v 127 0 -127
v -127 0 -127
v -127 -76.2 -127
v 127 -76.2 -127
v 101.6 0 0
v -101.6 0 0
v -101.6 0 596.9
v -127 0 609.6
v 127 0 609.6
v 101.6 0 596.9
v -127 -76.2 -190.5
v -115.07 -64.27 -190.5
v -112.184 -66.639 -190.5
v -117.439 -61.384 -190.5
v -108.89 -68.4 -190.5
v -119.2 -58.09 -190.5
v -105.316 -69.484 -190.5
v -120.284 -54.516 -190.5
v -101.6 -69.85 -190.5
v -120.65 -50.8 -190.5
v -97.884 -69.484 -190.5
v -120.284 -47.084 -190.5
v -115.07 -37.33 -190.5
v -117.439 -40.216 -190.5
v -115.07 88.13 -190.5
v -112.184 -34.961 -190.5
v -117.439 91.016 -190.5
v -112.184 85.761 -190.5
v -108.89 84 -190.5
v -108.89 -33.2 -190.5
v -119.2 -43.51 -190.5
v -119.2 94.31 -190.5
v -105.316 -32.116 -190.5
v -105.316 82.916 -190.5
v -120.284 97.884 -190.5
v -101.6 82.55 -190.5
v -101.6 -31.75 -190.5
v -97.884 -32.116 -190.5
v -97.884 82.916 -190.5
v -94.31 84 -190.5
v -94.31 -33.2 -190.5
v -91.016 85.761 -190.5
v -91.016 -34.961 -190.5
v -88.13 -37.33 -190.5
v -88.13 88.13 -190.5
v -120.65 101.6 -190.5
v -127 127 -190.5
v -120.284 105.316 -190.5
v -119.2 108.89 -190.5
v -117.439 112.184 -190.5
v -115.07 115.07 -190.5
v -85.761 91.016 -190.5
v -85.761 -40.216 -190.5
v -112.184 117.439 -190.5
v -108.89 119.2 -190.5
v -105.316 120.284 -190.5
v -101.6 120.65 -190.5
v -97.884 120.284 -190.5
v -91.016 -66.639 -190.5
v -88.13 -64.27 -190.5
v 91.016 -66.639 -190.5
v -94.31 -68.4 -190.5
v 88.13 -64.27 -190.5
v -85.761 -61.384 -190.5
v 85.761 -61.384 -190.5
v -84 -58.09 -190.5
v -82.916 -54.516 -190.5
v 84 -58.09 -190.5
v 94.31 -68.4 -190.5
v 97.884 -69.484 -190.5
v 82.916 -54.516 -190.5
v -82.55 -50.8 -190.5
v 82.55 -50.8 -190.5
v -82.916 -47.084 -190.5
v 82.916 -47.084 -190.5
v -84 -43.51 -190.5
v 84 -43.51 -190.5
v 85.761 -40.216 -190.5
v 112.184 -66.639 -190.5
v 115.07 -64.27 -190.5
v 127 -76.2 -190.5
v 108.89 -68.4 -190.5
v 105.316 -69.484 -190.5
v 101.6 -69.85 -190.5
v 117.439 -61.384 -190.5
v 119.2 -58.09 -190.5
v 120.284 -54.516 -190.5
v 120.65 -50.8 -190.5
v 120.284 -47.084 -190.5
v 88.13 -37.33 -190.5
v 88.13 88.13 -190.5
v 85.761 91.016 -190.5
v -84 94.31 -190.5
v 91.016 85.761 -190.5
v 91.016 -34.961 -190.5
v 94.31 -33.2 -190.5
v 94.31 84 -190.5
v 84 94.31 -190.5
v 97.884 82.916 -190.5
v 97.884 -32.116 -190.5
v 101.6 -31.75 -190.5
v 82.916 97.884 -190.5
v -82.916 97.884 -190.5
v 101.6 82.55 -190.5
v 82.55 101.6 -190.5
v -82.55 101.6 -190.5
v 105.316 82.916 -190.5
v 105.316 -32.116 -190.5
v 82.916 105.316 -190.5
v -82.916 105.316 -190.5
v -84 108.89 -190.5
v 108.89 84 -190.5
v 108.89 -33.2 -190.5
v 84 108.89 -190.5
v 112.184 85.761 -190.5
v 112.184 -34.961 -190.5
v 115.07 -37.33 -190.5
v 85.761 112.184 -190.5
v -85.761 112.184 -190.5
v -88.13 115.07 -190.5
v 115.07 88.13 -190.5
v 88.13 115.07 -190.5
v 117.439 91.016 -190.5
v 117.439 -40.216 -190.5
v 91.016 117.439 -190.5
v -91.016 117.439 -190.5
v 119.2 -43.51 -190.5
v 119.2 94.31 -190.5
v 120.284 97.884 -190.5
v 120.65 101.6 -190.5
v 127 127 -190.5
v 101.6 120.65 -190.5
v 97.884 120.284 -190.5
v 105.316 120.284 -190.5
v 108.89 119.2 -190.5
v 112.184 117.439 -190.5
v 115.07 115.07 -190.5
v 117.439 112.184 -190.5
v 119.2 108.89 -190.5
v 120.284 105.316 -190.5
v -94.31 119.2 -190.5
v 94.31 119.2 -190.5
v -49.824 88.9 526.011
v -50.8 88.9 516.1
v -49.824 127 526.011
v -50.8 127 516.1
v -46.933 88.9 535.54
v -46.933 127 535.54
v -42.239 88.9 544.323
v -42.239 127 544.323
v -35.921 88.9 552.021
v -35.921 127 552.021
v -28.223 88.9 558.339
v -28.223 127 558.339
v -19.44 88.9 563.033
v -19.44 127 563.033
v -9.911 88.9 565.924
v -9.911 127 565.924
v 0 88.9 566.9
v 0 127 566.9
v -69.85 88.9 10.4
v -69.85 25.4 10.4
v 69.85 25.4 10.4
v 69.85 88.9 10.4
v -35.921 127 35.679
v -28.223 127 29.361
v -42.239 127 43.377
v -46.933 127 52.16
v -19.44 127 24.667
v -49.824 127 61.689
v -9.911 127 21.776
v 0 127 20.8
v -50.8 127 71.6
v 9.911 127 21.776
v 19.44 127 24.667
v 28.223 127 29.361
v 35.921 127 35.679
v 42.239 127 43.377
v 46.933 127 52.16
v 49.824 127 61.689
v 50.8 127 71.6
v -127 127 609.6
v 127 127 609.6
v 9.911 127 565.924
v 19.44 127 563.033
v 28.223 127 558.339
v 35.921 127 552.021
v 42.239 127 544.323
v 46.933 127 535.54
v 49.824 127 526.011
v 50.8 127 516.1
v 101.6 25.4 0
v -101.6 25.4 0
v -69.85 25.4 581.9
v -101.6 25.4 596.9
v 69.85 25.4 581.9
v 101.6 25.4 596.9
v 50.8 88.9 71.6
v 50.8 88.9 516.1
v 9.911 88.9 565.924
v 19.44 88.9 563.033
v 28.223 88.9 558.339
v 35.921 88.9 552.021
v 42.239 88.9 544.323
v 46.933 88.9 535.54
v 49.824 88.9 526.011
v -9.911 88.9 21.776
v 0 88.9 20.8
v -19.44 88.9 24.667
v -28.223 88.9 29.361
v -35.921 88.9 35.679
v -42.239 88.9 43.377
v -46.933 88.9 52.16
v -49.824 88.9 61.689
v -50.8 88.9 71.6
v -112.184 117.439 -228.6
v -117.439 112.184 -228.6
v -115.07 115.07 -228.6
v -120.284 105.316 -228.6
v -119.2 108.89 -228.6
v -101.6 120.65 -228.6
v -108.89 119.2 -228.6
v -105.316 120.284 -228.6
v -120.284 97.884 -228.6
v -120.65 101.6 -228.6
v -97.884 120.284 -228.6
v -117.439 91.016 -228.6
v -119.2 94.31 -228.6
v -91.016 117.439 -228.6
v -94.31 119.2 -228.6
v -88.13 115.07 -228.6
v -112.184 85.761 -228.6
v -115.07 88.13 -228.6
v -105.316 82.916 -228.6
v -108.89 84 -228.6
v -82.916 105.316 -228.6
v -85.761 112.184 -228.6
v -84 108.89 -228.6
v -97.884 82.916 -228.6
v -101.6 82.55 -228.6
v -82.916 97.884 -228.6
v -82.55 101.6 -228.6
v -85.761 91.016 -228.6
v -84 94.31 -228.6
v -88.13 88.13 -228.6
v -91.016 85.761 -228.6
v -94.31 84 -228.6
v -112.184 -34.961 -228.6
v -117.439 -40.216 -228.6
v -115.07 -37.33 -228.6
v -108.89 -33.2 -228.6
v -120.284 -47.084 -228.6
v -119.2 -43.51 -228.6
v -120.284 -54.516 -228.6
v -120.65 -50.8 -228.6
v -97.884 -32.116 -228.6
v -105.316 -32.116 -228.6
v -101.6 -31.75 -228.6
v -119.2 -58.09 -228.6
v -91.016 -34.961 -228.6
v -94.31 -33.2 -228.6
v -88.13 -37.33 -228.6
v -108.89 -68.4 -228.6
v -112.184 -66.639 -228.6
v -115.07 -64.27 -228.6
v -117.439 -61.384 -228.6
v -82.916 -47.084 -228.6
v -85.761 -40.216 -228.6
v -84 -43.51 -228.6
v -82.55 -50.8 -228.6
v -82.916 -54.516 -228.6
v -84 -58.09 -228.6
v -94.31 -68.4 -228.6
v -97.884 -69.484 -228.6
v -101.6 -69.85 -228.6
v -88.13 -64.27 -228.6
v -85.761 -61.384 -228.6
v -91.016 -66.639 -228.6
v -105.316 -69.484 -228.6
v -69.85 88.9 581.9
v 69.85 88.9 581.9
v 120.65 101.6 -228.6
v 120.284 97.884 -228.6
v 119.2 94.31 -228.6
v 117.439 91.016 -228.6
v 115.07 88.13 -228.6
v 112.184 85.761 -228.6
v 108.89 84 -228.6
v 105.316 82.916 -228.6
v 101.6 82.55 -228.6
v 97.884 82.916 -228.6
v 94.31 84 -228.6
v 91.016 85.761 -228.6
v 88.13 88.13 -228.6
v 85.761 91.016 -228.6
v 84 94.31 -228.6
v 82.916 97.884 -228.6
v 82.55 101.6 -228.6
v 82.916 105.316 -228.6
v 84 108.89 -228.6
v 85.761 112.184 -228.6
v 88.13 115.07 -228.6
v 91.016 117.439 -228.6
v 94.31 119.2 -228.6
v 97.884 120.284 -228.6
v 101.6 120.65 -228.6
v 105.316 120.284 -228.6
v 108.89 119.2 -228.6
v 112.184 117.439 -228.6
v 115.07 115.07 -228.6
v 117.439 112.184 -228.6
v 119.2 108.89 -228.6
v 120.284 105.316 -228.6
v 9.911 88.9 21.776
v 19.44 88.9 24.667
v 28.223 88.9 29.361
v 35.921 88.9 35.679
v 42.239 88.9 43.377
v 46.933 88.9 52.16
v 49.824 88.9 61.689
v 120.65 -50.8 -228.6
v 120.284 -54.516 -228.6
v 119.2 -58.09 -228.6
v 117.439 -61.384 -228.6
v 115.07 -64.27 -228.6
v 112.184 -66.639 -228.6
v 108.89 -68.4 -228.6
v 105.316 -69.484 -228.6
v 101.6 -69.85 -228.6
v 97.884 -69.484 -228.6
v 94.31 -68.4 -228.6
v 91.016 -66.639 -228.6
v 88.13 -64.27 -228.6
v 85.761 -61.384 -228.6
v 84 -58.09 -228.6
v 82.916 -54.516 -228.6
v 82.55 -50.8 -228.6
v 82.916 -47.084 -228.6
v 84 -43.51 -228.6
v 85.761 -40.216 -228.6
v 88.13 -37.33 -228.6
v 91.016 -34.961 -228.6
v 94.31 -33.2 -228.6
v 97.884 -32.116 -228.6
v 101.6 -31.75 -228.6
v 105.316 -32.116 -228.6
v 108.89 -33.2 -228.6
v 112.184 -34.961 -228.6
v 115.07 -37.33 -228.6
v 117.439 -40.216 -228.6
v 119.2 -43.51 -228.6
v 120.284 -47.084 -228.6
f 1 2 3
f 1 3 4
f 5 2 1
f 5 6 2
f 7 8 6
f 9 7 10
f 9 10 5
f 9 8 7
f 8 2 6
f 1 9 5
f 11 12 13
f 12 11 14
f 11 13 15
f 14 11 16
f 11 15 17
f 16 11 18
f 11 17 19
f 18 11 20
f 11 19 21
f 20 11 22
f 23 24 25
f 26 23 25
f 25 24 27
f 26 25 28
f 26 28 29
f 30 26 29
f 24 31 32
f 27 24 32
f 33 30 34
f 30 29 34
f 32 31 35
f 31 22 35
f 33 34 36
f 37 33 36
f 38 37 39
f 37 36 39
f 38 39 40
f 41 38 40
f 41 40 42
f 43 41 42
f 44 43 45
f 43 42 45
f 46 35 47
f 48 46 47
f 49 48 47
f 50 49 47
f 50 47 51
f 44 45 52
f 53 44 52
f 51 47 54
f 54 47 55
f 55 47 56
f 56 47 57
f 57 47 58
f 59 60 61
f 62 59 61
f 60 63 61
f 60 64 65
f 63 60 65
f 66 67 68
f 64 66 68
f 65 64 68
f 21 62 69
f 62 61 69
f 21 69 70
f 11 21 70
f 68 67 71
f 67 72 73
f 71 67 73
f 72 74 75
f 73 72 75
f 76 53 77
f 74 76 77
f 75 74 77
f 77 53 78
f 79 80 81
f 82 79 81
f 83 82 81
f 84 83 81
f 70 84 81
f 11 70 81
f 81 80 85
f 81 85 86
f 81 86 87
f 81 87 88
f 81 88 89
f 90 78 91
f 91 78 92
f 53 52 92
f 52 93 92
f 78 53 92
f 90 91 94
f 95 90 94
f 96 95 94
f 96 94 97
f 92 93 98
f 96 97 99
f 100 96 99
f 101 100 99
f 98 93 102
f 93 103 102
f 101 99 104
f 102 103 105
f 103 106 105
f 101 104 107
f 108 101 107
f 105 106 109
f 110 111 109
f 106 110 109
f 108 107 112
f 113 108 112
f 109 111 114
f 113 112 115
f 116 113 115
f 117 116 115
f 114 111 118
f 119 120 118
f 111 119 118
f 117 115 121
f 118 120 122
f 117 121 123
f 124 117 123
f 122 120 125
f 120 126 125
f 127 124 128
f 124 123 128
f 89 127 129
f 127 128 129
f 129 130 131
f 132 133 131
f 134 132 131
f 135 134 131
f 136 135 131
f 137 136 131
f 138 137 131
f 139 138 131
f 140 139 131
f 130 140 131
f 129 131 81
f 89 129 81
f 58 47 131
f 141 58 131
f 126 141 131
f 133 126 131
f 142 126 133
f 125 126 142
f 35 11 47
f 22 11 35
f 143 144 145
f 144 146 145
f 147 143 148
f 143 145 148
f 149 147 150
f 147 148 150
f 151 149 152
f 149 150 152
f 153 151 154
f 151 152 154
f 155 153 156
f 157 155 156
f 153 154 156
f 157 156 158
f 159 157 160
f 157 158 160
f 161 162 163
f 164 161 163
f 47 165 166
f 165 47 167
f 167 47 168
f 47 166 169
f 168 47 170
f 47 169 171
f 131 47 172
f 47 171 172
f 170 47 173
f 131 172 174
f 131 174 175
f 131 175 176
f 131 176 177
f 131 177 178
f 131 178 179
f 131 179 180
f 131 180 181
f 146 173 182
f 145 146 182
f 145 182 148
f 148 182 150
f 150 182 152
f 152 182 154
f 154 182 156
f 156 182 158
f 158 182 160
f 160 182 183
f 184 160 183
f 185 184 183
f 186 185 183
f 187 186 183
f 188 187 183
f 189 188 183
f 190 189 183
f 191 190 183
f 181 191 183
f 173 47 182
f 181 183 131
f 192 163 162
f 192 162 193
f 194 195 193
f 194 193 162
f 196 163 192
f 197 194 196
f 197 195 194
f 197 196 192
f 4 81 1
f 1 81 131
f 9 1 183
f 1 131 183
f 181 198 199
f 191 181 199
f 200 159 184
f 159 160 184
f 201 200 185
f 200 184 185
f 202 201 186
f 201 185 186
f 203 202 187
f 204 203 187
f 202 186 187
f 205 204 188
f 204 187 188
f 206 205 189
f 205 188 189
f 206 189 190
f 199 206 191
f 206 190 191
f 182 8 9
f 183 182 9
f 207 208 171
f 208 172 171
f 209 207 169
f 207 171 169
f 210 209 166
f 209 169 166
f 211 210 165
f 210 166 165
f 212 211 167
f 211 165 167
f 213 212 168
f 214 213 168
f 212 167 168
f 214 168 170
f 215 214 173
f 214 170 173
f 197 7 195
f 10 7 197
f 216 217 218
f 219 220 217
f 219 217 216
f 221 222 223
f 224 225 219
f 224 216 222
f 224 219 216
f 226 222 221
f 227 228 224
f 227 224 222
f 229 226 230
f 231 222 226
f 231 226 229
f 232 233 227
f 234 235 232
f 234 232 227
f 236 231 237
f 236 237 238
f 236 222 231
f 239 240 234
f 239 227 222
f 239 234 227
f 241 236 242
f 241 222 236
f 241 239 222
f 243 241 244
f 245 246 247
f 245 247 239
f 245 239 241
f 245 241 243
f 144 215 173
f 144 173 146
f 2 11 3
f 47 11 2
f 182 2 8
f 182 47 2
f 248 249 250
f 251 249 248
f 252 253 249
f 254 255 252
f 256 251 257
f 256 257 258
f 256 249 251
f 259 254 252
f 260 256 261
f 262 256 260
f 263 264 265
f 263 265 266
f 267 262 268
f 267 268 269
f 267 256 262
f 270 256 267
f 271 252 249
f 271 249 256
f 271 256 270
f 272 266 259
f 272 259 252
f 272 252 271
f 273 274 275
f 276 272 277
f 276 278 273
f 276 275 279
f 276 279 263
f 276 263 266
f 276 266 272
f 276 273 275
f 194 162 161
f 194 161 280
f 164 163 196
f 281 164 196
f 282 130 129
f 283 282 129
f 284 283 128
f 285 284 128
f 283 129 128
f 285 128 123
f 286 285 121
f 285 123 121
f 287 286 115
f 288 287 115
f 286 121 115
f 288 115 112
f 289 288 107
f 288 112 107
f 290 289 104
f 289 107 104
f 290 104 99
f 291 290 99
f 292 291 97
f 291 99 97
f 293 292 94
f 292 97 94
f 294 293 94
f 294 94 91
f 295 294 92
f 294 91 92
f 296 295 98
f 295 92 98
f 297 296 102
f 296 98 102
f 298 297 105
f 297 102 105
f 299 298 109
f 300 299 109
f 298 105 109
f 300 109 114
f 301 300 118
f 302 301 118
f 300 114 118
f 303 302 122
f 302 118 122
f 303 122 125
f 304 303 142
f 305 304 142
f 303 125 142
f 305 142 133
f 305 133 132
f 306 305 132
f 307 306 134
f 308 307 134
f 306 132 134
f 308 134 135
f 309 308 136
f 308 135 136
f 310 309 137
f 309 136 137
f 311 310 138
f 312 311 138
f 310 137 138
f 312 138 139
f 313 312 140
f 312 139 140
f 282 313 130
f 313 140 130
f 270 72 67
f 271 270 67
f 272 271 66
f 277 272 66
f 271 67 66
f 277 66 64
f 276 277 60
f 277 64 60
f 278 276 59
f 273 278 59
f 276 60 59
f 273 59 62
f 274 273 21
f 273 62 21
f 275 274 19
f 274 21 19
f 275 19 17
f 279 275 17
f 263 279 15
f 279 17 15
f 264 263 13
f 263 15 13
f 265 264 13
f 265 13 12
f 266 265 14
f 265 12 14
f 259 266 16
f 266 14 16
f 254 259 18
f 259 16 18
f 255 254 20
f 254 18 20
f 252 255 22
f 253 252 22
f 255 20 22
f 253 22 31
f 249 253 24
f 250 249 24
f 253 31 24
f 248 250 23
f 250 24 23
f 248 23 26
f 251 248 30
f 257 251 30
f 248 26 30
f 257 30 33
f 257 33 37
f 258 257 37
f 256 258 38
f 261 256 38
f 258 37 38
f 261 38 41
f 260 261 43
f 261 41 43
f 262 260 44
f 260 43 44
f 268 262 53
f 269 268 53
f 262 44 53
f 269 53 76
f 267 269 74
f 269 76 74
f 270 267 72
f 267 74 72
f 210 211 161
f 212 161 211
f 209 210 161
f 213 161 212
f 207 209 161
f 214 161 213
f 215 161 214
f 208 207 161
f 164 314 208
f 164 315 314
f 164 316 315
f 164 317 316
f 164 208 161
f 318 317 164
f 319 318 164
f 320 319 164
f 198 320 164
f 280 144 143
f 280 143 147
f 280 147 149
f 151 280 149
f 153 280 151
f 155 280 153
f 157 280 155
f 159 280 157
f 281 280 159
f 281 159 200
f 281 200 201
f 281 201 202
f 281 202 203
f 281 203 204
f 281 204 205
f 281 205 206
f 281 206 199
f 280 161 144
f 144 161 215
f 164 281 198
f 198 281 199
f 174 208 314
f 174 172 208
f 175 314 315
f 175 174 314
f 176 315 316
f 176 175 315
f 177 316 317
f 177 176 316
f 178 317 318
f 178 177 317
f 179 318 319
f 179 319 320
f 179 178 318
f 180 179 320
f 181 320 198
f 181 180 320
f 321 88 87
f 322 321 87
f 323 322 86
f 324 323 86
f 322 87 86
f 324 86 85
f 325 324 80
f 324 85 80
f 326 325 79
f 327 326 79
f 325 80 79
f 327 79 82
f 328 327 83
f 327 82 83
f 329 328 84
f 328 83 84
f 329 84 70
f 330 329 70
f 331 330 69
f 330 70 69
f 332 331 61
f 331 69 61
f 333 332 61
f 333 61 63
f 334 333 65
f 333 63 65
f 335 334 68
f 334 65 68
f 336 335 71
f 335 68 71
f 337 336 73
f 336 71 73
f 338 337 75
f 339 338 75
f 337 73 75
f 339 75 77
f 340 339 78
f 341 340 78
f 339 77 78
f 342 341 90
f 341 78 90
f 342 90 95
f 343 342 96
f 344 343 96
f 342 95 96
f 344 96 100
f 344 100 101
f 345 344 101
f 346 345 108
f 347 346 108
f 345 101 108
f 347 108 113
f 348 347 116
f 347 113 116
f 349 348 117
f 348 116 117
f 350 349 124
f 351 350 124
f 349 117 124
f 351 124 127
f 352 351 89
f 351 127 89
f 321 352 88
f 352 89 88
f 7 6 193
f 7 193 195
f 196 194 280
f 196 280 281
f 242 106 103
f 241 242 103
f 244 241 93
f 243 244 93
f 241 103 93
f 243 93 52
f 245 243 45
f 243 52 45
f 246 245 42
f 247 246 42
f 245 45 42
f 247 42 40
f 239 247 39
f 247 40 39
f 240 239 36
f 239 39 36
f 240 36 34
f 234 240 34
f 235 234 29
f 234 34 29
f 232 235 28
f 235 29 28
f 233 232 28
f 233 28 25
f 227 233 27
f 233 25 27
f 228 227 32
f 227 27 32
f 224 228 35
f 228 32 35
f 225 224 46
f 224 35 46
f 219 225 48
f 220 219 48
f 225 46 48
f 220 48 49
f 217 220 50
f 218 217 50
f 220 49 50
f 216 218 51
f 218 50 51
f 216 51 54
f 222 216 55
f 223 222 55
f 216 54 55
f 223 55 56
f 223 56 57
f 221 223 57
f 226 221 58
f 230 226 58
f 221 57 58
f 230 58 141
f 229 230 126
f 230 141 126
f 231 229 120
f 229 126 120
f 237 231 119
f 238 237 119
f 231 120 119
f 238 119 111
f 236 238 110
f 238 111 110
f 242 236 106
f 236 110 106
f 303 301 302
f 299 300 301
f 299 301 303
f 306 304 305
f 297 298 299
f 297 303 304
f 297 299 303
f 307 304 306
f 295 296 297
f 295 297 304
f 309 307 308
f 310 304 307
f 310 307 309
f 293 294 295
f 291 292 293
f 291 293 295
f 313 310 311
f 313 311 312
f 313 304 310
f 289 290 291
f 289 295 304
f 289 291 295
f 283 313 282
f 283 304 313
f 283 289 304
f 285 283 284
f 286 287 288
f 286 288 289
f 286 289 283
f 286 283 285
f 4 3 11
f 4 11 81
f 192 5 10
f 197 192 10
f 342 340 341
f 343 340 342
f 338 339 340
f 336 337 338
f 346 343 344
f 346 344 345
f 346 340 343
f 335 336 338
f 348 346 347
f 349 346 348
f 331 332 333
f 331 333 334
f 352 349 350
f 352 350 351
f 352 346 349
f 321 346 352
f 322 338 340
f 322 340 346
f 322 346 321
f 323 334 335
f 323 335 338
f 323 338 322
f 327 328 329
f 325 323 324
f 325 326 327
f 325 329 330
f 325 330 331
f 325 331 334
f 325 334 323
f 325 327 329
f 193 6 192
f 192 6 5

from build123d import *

# Parameters (mm, degrees)
F0_W     = 254
F0_H     = 736.6
F0_W_2   = 203.2
F0_H_2   = 596.9
F0_W_3   = 139.7
F0_H_3   = 571.5
F0_W_4   = 101.6
F0_H_4   = 546.1
F0_H_5   = 63.5
F1_DEPTH = 127
F2_DEPTH = 25.4
F3_DEPTH = 88.9
F4_R     = 50.79999
F5_DEPTH = 76.2
F6_R     = 19.05
F7_DEPTH = 38.1


# Not quite as in the source:
# - a fillet or chamfer is up to 0.001 mm smaller than in the source, because OpenCascade refuses the exact size
# - a feature names something its author has since deleted; it is built from what else it names


with BuildPart() as f1:
    # F0 (on Front) → F1 (new body)
    with BuildSketch(Plane.XZ):
        with Locations((0, 241.3)):
            Rectangle(F0_W, F0_H)
        with Locations((0, 298.45)):
            Rectangle(F0_W_2, F0_H_2, mode=Mode.SUBTRACT)
        with Locations((0, 298.45)):
            Rectangle(F0_W_2, F0_H_2)
        with Locations((0, 296.15)):
            Rectangle(F0_W_3, F0_H_3, mode=Mode.SUBTRACT)
        with Locations((0, 296.15)):
            Rectangle(F0_W_3, F0_H_3)
        with Locations((0, 293.85)):
            Rectangle(F0_W_4, F0_H_4, mode=Mode.SUBTRACT)
        with Locations((0, -158.75)):
            Rectangle(F0_W, F0_H_5)
    extrude(amount=-F1_DEPTH)

    # F0 (on Front) → F2 (cut)
    with BuildSketch(Plane.XZ):
        with Locations((0, 298.45)):
            Rectangle(F0_W_2, F0_H_2)
        with Locations((0, 296.15)):
            Rectangle(F0_W_3, F0_H_3, mode=Mode.SUBTRACT)
    extrude(amount=-F2_DEPTH, mode=Mode.SUBTRACT)

    # F0 (on Front) → F3 (cut)
    with BuildSketch(Plane.XZ):
        with Locations((0, 296.15)):
            Rectangle(F0_W_3, F0_H_3)
        with Locations((0, 293.85)):
            Rectangle(F0_W_4, F0_H_4, mode=Mode.SUBTRACT)
    extrude(amount=-F3_DEPTH, mode=Mode.SUBTRACT)

    # F4 (radius 50.8 in the source; OpenCascade refuses exactly that, so slightly less here)
    f4_edges = [f1.edges().sort_by_distance(p)[0] for p in [
        (50.8, 107.95, 566.9),
        (-50.8, 107.95, 566.9),
        (-50.8, 107.95, 20.8),
        (50.8, 107.95, 20.8),
    ]]
    fillet(f4_edges, radius=F4_R)

    # F0 (on Front) → F5 (join)
    with BuildSketch(Plane.XZ):
        with Locations((0, -158.75)):
            Rectangle(F0_W, F0_H_5)
    extrude(amount=F5_DEPTH)

    # F6 (on face) → F7 (join)
    with BuildSketch(Plane(origin=(0, 0, -190.5), x_dir=(1, 0, 0), z_dir=(0, 0, -1))):
        with Locations((-101.6, 50.8)):
            Circle(F6_R)
        with Locations((101.6, 50.8)):
            Circle(F6_R)
        with Locations((-101.6, -101.6)):
            Circle(F6_R)
        with Locations((101.6, -101.6)):
            Circle(F6_R)
    extrude(amount=F7_DEPTH)


solid = f1.part
